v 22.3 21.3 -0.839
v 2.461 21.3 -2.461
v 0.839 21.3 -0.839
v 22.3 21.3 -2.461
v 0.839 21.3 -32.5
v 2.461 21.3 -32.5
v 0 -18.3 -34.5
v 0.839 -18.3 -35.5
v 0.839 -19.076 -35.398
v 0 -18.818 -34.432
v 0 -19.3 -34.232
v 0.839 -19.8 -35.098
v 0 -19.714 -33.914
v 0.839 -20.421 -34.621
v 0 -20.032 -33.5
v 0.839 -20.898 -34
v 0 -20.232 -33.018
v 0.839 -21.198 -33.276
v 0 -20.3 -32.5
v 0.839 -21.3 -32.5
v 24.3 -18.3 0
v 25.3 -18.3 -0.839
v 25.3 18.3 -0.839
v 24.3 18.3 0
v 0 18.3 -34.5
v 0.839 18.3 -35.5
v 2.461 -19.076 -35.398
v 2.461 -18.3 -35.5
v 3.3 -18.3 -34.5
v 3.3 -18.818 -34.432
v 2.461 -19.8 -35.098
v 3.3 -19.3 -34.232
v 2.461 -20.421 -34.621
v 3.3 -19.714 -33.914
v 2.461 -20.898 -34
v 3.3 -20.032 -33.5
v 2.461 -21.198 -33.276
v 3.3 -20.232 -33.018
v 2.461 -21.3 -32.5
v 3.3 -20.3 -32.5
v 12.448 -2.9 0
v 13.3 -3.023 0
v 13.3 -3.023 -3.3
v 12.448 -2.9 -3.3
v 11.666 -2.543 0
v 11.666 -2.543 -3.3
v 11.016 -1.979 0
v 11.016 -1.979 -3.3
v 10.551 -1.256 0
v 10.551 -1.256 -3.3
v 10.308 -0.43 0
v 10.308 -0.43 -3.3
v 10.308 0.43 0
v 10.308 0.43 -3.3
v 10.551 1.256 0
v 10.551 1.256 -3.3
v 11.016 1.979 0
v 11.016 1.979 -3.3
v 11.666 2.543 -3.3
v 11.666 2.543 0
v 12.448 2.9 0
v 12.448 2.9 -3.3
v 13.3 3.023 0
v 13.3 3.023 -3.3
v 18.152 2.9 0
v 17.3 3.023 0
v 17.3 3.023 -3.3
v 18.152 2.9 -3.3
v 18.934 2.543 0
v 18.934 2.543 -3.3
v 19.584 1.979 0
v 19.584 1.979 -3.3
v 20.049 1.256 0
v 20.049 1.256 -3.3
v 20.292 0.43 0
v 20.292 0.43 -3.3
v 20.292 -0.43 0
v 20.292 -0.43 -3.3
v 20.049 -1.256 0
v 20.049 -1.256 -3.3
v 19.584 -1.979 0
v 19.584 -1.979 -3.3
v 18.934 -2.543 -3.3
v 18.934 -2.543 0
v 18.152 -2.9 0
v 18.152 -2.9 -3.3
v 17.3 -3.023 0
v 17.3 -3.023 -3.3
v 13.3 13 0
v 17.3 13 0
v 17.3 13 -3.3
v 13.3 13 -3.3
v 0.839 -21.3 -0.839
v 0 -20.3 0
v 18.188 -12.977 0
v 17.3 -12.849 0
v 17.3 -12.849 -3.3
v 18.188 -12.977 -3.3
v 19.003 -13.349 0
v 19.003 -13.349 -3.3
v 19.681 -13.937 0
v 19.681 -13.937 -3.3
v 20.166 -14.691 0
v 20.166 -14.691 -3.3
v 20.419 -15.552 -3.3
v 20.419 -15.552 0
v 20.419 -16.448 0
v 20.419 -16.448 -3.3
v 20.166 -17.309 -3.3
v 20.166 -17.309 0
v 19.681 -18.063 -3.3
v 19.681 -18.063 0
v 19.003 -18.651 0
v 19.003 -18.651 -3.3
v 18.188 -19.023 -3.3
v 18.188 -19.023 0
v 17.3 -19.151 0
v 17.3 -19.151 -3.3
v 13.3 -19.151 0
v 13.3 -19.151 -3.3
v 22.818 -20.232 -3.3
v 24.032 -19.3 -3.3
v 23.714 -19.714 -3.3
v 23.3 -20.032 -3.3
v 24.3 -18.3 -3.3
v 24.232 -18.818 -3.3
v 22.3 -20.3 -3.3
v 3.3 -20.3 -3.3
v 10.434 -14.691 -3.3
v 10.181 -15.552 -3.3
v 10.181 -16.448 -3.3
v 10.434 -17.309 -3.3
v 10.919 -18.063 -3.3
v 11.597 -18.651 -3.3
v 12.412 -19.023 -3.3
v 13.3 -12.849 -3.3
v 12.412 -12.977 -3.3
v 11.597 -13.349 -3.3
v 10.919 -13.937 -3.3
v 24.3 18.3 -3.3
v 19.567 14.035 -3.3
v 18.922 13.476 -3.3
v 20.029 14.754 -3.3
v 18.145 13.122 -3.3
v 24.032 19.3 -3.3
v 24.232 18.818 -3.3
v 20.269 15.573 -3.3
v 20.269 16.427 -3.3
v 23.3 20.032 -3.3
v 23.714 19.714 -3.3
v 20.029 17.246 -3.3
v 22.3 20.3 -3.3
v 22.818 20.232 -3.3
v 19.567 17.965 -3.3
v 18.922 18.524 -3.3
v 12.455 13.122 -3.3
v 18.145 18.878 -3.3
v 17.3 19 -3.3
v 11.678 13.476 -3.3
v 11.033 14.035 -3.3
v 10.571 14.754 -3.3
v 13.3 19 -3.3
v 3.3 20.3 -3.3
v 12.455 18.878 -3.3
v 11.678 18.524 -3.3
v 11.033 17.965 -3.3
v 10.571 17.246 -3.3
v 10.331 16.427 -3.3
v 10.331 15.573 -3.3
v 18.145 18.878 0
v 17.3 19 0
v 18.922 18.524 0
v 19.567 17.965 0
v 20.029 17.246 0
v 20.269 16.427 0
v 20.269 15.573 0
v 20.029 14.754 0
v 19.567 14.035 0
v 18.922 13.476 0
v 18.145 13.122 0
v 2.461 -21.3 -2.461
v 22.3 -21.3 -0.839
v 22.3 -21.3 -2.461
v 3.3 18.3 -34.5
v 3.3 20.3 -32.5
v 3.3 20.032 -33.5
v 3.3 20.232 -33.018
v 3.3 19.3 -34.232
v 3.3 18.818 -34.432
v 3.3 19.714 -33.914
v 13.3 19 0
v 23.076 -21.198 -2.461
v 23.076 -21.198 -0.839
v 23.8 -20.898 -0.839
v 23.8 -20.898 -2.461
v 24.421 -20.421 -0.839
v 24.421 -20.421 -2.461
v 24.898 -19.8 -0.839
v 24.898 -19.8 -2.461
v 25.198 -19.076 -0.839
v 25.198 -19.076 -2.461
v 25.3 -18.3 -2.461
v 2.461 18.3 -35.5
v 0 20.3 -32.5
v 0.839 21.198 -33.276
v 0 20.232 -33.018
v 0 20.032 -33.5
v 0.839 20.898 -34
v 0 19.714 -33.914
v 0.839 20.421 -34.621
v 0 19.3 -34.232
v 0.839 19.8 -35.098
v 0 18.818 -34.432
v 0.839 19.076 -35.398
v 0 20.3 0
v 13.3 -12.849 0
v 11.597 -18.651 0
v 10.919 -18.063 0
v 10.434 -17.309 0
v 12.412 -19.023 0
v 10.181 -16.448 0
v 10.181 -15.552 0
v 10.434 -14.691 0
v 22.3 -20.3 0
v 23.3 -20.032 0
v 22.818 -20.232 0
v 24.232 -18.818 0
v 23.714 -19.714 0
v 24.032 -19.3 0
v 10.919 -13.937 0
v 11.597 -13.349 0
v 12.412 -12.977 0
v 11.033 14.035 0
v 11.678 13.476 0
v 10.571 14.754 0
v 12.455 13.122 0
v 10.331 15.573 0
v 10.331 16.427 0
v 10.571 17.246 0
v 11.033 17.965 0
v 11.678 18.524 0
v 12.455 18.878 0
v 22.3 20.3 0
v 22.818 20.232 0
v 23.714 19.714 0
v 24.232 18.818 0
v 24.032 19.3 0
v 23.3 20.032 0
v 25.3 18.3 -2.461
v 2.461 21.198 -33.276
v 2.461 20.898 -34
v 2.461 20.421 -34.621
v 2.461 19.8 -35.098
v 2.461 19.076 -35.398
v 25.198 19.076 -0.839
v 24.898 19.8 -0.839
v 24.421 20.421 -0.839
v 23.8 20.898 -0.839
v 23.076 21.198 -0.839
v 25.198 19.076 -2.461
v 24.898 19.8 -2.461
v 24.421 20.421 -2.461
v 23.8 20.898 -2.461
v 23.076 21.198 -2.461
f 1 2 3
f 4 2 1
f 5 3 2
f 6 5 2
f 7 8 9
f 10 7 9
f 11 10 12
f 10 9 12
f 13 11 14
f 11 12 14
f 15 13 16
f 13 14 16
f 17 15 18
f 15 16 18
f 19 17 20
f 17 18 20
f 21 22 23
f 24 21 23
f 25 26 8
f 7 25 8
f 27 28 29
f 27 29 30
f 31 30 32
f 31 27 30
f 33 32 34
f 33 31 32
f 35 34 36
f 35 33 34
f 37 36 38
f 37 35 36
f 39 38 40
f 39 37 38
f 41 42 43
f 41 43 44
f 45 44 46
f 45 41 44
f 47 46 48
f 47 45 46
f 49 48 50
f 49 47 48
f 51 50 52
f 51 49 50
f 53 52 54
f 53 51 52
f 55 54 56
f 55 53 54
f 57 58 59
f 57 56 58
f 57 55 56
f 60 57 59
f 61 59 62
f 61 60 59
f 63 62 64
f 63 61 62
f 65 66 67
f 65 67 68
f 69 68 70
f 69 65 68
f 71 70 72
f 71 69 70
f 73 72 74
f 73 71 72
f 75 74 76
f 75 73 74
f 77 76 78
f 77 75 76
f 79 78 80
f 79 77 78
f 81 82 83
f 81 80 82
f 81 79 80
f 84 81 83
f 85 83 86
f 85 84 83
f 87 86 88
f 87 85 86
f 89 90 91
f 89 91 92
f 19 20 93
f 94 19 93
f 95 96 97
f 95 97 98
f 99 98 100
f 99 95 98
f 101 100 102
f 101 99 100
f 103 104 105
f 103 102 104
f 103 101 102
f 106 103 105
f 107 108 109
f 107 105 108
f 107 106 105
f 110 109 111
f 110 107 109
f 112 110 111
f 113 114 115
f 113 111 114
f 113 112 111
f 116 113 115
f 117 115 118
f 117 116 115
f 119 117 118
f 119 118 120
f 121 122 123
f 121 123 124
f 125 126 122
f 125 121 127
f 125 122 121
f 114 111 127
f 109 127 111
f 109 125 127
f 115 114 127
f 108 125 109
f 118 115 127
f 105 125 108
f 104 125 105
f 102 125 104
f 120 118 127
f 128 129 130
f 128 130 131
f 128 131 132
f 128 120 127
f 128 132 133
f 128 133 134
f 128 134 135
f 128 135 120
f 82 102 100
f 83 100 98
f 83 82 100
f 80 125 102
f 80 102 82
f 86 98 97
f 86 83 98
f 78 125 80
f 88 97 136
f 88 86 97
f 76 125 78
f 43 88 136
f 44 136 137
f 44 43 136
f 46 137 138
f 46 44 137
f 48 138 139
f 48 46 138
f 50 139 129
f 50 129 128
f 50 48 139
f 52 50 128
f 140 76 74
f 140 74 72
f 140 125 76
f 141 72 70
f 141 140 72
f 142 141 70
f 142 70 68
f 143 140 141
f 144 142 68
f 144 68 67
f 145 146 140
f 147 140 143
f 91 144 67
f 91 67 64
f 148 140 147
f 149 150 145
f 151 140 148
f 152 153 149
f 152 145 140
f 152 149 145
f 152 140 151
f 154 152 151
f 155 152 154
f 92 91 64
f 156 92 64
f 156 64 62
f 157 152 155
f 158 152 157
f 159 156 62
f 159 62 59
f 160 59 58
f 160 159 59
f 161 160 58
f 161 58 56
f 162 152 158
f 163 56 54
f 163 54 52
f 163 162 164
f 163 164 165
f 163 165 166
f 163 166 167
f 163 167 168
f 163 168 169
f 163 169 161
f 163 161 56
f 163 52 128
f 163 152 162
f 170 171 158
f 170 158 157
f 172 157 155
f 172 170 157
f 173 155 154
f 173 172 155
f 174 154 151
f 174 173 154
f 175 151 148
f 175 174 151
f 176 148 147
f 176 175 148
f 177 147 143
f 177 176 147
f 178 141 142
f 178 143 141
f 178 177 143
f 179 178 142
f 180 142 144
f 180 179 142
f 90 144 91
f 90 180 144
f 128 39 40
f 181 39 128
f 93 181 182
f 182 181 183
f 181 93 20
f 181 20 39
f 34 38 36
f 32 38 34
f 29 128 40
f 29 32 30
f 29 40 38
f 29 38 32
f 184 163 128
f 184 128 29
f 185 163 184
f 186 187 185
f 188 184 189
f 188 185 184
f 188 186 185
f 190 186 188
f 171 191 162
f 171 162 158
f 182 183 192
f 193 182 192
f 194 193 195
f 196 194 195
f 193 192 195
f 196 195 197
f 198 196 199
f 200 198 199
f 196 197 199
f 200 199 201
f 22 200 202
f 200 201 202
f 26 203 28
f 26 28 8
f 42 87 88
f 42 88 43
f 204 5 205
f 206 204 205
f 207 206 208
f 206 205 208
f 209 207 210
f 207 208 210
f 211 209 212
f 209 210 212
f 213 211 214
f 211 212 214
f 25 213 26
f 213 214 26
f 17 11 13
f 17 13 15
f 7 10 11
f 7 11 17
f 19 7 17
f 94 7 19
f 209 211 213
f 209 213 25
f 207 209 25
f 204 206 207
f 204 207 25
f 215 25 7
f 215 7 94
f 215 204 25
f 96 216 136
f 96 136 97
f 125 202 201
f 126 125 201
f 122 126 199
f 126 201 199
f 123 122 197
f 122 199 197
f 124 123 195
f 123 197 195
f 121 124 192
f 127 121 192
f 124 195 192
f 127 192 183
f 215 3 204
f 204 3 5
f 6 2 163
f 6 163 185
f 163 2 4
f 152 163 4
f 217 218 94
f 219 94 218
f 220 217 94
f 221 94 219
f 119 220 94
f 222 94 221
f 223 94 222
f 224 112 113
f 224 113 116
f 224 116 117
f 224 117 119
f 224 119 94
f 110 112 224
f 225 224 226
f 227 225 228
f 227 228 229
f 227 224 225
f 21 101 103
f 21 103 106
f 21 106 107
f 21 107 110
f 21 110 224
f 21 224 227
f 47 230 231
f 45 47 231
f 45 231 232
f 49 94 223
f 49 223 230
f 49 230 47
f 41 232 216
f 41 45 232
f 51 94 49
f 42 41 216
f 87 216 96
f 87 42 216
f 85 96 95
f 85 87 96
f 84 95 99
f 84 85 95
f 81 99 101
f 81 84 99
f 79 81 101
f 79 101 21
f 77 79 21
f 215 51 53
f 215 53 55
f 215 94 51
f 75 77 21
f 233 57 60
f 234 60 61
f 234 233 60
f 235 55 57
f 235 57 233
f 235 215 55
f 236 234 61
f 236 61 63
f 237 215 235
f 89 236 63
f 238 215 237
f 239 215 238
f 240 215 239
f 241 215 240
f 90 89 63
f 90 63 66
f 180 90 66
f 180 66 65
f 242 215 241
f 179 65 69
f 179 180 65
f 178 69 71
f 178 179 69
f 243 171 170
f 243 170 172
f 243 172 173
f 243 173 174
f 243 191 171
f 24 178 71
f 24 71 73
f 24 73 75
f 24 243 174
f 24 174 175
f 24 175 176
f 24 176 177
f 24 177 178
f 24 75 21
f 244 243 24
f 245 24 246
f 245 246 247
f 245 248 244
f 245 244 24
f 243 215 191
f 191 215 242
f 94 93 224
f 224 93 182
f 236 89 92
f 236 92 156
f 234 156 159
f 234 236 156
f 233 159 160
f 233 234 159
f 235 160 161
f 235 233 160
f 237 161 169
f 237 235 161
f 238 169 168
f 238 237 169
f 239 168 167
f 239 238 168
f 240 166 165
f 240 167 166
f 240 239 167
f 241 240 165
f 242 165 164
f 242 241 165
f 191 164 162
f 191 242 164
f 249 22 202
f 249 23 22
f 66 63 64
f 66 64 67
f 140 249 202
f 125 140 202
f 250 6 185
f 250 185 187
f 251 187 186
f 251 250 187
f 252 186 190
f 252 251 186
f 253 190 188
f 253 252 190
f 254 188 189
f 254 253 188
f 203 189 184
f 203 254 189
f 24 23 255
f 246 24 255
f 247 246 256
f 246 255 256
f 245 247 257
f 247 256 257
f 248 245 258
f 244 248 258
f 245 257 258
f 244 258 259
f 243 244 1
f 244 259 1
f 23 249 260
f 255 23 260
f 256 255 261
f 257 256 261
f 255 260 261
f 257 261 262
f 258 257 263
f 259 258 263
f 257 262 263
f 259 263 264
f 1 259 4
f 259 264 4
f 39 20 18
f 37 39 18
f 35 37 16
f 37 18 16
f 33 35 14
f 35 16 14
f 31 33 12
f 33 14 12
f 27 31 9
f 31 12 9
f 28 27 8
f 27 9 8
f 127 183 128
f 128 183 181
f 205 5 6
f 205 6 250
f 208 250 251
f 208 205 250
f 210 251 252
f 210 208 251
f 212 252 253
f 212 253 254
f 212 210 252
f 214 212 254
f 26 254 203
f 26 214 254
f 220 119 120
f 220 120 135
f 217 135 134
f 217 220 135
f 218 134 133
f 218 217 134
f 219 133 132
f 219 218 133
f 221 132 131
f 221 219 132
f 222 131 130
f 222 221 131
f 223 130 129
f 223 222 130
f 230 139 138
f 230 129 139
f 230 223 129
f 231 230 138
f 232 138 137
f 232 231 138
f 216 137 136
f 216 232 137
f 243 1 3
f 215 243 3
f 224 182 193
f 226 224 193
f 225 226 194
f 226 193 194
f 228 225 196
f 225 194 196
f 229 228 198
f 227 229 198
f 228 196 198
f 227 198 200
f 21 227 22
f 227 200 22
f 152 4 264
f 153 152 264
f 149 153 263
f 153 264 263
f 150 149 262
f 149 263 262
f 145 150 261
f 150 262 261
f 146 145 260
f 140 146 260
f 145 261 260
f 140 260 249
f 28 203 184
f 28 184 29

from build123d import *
from OCP.BRepFilletAPI import BRepFilletAPI_MakeChamfer

# Parameters (mm, degrees)
EXTRUDE_1_DEPTH     = 21.3
CUT_EXTRUDE_1_DEPTH = 42.6
FILLET_1_R          = 3
CHAMFER_1_SIZE      = 1
CHAMFER_1_SIZE2     = 0.839099631


with BuildPart() as part:
    # Эскиз1 → Бобышка-Вытянуть1 (new, symmetric)
    with BuildSketch(Plane(origin=(0, 0, 0), x_dir=(1, 0, 0), z_dir=(0, 1, 0))):
        Polygon((0, 0), (25.3, 0), (25.3, 3.3), (3.3, 3.3), (3.3, 35.5), (0, 35.5), align=None)
    extrude(amount=EXTRUDE_1_DEPTH, both=True)

    # Эскиз2 → Вырез-Вытянуть1 (cut)
    with BuildSketch(Plane.XY):
        with BuildLine():
            Line((17.3, 13), (13.3, 13))
            ThreePointArc((13.3, 13), (10.3, 16), (13.3, 19))
            Line((13.3, 19), (17.3, 19))
            ThreePointArc((17.3, 19), (20.3, 16), (17.3, 13))
        make_face()
        with BuildLine():
            Line((17.3, -3.022560491), (13.3, -3.022560491))
            ThreePointArc((13.3, -3.022560491), (10.277439509, 0), (13.3, 3.022560491))
            Line((13.3, 3.022560491), (17.3, 3.022560491))
            ThreePointArc((17.3, 3.022560491), (20.322560491, 0), (17.3, -3.022560491))
        make_face()
        with BuildLine():
            Line((17.3, -19.150761356), (13.3, -19.150761356))
            ThreePointArc((13.3, -19.150761356), (10.149238644, -16), (13.3, -12.849238644))
            Line((13.3, -12.849238644), (17.3, -12.849238644))
            ThreePointArc((17.3, -12.849238644), (20.450761356, -16), (17.3, -19.150761356))
        make_face()
    extrude(amount=-CUT_EXTRUDE_1_DEPTH, mode=Mode.SUBTRACT)

    # Скругление1
    fillet_1_edges = [part.edges().sort_by_distance(p)[0] for p in [
        (25.3, 21.3, -1.65),
        (1.65, 21.3, -35.5),
        (1.65, -21.3, -35.5),
        (25.3, -21.3, -1.65),
    ]]
    fillet(fillet_1_edges, radius=FILLET_1_R)

    # Фаска1: one chamfer whose edges measure the first distance from different faces: ONE call of the kernel's chamfer builder (chamfer() names one face for all edges)
    chamfer_1_edges_1 = [part.edges().sort_by_distance(p)[0] for p in [
        (24.421320344, -20.421320344, 0),
        (11.15, -21.3, 0),
        (11.15, 21.3, 0),
        (25.3, 0, 0),
        (24.421320344, 20.421320344, 0),
    ]]
    chamfer_1_side_1 = [part.faces().sort_by_distance(p)[0] for p in [
        (11.15, -20.804535571, 0),
    ]]
    chamfer_1_edges_2 = [part.edges().sort_by_distance(p)[0] for p in [
        (3.3, 21.3, -17.9),
        (3.3, -21.3, -17.9),
        (3.3, 0, -35.5),
        (3.3, 20.421320344, -34.621320344),
        (3.3, -20.421320344, -34.621320344),
    ]]
    chamfer_1_side_2 = [part.faces().sort_by_distance(p)[0] for p in [
        (3.3, 0, -19.356425923),
    ]]
    chamfer_1_edges_3 = [part.edges().sort_by_distance(p)[0] for p in [
        (0, 0, -35.5),
        (0, -21.3, -16.25),
        (0, 21.3, -16.25),
        (0, 20.421320344, -34.621320344),
        (0, -20.421320344, -34.621320344),
    ]]
    chamfer_1_side_3 = [part.faces().sort_by_distance(p)[0] for p in [
        (0, 0, -17.706261494),
    ]]
    chamfer_1_edges_4 = [part.edges().sort_by_distance(p)[0] for p in [
        (12.8, -21.3, -3.3),
        (12.8, 21.3, -3.3),
        (25.3, 0, -3.3),
        (24.421320344, 20.421320344, -3.3),
        (24.421320344, -20.421320344, -3.3),
    ]]
    chamfer_1_side_4 = [part.faces().sort_by_distance(p)[0] for p in [
        (24.820546144, 0, -3.3),
    ]]
    chamfer_1 = BRepFilletAPI_MakeChamfer(part.part.solid().wrapped)
    for e in chamfer_1_edges_1:
        chamfer_1.Add(CHAMFER_1_SIZE, CHAMFER_1_SIZE2, e.wrapped, chamfer_1_side_1[0].wrapped)  # the first distance lies on this face
    for e in chamfer_1_edges_2:
        chamfer_1.Add(CHAMFER_1_SIZE, CHAMFER_1_SIZE2, e.wrapped, chamfer_1_side_2[0].wrapped)  # the first distance lies on this face
    for e in chamfer_1_edges_3:
        chamfer_1.Add(CHAMFER_1_SIZE, CHAMFER_1_SIZE2, e.wrapped, chamfer_1_side_3[0].wrapped)  # the first distance lies on this face
    for e in chamfer_1_edges_4:
        chamfer_1.Add(CHAMFER_1_SIZE, CHAMFER_1_SIZE2, e.wrapped, chamfer_1_side_4[0].wrapped)  # the first distance lies on this face
    add(Compound.cast(chamfer_1.Shape()), mode=Mode.REPLACE)


solid = part.part
